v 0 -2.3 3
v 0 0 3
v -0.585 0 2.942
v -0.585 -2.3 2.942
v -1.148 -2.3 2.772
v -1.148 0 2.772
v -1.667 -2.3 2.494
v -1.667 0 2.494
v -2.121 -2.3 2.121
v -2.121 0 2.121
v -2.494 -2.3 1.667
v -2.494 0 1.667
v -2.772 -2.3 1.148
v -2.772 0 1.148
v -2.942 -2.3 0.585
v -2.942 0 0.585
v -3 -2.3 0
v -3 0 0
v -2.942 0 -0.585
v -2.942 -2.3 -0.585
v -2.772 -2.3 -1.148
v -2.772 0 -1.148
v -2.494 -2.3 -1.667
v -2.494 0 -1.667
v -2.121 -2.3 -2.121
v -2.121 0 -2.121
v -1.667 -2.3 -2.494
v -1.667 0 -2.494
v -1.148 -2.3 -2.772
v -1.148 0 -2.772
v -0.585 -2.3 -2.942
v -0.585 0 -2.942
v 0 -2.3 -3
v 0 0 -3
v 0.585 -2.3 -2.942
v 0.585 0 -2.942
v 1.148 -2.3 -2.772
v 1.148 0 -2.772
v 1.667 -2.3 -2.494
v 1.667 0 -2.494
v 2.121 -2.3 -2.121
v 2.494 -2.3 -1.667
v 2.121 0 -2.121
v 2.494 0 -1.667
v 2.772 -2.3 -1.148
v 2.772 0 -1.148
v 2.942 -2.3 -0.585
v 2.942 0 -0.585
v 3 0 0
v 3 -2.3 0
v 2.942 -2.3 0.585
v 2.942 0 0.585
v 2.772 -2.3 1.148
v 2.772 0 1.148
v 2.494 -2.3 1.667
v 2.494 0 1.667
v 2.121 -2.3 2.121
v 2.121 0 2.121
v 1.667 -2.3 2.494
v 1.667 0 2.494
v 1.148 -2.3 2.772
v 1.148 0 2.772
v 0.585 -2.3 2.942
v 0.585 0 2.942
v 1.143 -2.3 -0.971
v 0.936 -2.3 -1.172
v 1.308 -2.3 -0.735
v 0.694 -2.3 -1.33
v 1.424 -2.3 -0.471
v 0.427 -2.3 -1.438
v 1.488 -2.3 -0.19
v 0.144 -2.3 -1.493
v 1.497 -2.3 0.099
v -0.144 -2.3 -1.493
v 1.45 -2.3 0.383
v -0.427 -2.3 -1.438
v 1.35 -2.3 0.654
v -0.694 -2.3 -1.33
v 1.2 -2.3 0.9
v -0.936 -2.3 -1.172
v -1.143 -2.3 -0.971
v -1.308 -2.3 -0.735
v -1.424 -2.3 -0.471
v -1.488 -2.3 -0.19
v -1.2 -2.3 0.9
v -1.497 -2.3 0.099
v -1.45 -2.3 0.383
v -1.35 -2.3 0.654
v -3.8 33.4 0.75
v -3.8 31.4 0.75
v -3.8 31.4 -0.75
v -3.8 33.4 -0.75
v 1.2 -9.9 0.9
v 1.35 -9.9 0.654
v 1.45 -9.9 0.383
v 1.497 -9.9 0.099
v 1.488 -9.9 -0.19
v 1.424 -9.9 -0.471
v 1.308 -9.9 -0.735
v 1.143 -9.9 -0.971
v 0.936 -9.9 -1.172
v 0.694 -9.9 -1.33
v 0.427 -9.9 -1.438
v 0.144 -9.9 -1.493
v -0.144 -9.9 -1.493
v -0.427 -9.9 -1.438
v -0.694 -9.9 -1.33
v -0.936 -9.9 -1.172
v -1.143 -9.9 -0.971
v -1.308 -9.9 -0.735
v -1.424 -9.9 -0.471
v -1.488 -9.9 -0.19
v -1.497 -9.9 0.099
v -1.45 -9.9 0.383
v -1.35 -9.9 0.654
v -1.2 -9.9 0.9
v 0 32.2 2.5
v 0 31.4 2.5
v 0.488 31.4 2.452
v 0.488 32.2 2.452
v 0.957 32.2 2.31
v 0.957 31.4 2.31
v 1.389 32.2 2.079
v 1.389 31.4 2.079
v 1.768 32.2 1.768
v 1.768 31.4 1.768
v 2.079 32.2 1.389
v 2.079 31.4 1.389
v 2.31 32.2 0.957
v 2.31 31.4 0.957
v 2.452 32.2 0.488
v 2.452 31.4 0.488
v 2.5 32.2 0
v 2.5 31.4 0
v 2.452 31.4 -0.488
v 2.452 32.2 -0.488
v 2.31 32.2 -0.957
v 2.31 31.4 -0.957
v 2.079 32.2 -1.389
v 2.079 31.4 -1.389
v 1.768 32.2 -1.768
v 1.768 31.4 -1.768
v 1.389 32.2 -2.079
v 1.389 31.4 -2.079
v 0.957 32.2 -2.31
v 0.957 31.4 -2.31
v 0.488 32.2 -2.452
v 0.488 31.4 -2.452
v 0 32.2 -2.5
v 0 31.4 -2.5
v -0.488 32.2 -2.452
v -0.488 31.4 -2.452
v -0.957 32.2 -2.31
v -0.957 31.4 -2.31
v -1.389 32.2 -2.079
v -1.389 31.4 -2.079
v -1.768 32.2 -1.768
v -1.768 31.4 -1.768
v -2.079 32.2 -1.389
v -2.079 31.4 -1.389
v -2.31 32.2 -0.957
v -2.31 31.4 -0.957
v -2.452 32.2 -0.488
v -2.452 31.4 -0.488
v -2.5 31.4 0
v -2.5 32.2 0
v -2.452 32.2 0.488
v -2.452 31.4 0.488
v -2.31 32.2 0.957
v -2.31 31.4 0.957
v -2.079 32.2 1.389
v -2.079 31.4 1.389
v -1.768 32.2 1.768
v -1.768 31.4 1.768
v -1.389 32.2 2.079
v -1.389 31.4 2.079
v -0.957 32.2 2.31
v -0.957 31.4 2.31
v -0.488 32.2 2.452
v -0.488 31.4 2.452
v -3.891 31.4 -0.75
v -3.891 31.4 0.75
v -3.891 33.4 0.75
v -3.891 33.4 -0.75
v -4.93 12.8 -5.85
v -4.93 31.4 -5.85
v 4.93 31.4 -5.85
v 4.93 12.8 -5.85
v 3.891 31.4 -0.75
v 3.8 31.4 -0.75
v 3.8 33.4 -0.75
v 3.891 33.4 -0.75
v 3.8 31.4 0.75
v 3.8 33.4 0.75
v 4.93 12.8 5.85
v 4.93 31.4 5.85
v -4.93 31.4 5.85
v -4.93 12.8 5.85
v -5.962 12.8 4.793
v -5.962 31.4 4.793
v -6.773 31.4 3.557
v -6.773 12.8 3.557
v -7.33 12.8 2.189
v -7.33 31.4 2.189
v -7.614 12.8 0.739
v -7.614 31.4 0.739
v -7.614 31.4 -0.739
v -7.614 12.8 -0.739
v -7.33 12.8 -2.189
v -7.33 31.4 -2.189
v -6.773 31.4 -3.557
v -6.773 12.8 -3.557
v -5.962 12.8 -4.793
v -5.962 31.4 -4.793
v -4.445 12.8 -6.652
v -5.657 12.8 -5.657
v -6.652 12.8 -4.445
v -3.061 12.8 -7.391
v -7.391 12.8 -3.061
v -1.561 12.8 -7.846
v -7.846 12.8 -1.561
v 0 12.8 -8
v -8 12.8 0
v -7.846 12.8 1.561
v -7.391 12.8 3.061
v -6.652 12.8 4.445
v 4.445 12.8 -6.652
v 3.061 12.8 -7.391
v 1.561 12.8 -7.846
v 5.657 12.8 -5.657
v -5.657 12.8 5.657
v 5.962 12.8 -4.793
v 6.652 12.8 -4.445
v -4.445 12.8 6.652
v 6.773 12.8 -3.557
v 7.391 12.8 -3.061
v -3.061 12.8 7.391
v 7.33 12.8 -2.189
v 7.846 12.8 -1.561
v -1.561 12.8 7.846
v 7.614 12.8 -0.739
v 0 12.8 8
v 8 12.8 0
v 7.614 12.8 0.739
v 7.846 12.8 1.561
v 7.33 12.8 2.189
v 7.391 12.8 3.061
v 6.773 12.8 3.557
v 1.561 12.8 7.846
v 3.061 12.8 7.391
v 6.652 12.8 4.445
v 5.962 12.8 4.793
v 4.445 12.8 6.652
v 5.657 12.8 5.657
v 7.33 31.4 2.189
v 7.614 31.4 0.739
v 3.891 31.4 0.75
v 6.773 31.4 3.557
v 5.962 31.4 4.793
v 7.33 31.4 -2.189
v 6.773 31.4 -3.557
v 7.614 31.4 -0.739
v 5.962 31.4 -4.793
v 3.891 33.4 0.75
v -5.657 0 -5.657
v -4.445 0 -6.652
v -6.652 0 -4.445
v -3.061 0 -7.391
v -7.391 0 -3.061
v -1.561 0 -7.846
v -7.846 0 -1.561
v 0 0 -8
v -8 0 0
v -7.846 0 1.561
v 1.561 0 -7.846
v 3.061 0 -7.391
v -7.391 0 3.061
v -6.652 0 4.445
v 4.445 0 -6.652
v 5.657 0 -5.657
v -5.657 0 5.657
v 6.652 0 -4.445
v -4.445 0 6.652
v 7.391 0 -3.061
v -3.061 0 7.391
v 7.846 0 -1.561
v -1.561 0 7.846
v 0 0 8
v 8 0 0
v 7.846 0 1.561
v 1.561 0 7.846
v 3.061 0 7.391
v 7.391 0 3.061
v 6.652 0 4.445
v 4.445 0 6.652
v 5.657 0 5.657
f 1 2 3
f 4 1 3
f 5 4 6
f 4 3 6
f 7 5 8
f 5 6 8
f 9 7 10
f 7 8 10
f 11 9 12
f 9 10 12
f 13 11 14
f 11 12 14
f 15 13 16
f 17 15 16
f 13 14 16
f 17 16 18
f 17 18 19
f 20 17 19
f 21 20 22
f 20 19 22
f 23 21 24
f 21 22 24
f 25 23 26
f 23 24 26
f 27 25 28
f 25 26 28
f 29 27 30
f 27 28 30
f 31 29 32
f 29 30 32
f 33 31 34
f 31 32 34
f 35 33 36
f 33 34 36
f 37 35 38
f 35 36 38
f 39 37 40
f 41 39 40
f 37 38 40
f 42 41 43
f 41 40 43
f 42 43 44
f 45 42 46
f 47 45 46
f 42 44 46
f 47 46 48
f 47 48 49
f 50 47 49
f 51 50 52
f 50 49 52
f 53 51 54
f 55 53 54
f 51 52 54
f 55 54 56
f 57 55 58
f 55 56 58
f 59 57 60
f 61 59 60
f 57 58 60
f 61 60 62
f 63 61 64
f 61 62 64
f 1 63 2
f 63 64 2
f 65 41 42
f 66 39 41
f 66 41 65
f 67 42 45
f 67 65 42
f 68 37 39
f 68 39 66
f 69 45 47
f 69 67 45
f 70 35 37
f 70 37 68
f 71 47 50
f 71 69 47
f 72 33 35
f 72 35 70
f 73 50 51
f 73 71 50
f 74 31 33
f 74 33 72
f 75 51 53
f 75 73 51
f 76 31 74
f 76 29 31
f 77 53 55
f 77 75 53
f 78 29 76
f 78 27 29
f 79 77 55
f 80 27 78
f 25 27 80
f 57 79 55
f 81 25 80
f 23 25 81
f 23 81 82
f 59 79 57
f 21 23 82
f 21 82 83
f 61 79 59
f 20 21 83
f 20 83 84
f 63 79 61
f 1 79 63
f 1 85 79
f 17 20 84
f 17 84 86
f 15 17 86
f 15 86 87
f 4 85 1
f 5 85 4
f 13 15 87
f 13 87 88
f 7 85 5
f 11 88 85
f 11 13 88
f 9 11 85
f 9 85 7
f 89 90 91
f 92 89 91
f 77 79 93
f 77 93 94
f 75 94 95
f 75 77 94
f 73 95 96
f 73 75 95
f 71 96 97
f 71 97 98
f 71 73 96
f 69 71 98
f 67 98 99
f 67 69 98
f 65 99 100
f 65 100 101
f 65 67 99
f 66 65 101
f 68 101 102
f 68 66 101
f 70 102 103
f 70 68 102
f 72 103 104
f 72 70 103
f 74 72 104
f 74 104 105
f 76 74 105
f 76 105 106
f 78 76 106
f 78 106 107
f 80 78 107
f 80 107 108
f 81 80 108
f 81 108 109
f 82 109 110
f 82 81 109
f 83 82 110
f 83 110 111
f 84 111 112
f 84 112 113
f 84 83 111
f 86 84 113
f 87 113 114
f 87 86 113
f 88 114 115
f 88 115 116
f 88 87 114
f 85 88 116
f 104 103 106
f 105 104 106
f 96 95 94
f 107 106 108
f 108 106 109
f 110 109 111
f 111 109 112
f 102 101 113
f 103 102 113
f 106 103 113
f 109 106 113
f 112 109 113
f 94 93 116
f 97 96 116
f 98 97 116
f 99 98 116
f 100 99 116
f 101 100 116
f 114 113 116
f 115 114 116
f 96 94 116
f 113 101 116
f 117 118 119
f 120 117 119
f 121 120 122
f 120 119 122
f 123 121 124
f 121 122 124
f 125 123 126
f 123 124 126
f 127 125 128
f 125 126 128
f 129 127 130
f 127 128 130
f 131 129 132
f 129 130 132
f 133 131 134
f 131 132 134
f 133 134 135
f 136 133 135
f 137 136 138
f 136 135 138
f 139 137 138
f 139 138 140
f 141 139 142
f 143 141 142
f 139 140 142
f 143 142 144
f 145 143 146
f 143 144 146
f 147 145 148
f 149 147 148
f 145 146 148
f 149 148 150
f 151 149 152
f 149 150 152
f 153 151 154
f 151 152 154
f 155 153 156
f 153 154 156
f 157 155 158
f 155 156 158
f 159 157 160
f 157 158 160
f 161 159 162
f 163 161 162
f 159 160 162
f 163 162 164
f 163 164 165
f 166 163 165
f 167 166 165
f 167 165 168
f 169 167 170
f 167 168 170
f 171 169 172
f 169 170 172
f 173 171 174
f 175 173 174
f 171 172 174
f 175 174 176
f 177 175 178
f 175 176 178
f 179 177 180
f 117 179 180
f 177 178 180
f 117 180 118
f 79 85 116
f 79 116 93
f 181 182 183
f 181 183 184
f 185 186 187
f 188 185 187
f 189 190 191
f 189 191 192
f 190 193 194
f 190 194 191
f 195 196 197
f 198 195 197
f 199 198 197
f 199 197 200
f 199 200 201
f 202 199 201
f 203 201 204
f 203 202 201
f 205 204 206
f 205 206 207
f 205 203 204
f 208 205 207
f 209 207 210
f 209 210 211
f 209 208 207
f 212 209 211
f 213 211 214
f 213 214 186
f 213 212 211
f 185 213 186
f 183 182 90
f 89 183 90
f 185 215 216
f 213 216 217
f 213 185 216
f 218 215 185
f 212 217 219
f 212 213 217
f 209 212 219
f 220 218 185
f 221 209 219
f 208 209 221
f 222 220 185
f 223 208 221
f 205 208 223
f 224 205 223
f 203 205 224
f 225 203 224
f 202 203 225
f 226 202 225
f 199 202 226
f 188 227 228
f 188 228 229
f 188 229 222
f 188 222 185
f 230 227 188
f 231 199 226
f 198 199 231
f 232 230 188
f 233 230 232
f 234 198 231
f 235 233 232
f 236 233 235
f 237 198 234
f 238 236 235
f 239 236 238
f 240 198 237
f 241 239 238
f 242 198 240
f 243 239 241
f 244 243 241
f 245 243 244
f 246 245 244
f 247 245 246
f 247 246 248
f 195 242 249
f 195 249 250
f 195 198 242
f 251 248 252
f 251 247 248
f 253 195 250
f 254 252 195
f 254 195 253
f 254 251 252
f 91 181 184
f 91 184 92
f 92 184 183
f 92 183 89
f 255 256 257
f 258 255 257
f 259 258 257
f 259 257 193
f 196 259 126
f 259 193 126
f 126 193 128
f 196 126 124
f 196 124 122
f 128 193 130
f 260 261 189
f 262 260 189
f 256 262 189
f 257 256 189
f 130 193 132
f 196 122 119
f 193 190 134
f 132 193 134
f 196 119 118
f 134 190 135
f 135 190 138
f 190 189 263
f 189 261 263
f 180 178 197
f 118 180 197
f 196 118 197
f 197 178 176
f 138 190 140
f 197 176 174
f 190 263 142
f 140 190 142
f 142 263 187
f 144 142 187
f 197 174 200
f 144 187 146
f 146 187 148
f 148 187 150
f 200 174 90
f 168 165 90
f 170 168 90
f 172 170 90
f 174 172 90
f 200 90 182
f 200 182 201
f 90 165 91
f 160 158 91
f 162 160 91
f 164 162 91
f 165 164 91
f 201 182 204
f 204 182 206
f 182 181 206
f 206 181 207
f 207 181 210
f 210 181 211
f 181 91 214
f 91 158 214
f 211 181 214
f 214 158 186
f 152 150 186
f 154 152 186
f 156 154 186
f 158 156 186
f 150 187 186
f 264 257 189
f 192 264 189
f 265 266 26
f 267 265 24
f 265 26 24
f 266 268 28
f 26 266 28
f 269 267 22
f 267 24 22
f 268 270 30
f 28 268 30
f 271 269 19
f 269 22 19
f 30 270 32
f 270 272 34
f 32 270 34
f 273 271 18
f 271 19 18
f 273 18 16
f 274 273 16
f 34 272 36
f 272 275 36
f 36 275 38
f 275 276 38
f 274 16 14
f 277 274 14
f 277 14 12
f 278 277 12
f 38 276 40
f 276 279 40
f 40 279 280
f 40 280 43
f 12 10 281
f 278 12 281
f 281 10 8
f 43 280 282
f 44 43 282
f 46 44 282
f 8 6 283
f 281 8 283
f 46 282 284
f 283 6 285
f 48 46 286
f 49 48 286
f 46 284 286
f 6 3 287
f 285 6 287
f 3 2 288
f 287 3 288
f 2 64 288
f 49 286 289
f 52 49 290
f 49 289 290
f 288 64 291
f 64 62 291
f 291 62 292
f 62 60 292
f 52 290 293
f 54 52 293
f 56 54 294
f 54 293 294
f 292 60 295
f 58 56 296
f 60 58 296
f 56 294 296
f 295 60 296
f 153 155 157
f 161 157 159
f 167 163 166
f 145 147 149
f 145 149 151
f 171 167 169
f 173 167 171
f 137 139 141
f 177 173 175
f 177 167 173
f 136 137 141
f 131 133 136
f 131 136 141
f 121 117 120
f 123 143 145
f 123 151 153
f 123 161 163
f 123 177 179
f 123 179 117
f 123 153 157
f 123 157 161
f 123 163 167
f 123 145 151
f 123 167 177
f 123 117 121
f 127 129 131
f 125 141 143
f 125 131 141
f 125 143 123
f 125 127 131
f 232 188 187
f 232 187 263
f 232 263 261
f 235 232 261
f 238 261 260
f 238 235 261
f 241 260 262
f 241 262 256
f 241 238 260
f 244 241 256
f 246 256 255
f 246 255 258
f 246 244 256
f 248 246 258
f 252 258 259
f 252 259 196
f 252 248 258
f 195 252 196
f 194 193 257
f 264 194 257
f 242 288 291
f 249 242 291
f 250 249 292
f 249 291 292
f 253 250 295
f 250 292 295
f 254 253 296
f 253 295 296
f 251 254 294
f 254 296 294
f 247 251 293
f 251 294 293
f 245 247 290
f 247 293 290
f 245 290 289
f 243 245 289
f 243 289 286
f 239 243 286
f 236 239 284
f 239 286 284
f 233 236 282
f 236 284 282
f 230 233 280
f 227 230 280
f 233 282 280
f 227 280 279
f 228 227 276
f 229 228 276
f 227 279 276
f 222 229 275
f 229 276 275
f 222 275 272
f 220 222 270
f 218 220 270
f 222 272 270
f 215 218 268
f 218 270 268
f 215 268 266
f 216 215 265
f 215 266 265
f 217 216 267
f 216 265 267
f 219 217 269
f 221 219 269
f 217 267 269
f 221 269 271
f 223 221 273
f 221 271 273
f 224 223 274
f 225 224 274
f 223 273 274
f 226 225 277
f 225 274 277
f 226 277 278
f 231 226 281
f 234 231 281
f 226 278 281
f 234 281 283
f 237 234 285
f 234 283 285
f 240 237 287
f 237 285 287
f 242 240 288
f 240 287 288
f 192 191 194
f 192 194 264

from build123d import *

# Parameters (mm, degrees)
SKETCH_1_R      = 8
EXTRUDE_1_DEPTH = 12.8
EXTRUDE_2_DEPTH = 18.6
SKETCH_3_R      = 2.5
EXTRUDE_3_DEPTH = 0.8
SKETCH_4_W      = 0.091344541
SKETCH_4_H      = 1.5
EXTRUDE_4_DEPTH = 2
SKETCH_5_R      = 3
EXTRUDE_5_DEPTH = 2.3
EXTRUDE_6_DEPTH = 7.6


with BuildPart() as part:
    # Эскиз1 → Бобышка-Вытянуть1 (new body)
    with BuildSketch(Plane(origin=(0, 0, 0), x_dir=(1, 0, 0), z_dir=(0, 1, 0))):
        with Locations(Location((0, 0, 0), (0, 0, 270))):
            Circle(SKETCH_1_R)
    extrude(amount=EXTRUDE_1_DEPTH)

    # Эскиз2 → Бобышка-Вытянуть2 (add)
    with BuildSketch(Plane(origin=(0, 12.8, 0), x_dir=(1, 0, 0), z_dir=(0, 1, 0))):
        with BuildLine():
            Line((-4.929503018, 5.85), (4.929503018, 5.85))
            ThreePointArc((4.929503018, 5.85), (7.65, 0), (4.929503018, -5.85))
            Line((4.929503018, -5.85), (-4.929503018, -5.85))
            ThreePointArc((-4.929503018, -5.85), (-7.65, 0), (-4.929503018, 5.85))
        make_face()
    extrude(amount=EXTRUDE_2_DEPTH)

    # Эскиз3 → Бобышка-Вытянуть3 (add)
    with BuildSketch(Plane(origin=(0, 31.4, 0), x_dir=(1, 0, 0), z_dir=(0, 1, 0))):
        with Locations(Location((0, 0, 0), (0, 0, 270))):
            Circle(SKETCH_3_R)
    extrude(amount=EXTRUDE_3_DEPTH)

    # Эскиз4 → Бобышка-Вытянуть4 (add)
    with BuildSketch(Plane(origin=(0, 31.4, 0), x_dir=(1, 0, 0), z_dir=(0, 1, 0))):
        with Locations((-3.845672271, 0)):
            Rectangle(SKETCH_4_W, SKETCH_4_H)
        with Locations((3.845672271, 0)):
            Rectangle(SKETCH_4_W, SKETCH_4_H)
    extrude(amount=EXTRUDE_4_DEPTH)

    # Эскиз5 → Бобышка-Вытянуть5 (add)
    with BuildSketch(Plane.XZ):
        with Locations(Location((0, 0, 0), (0, 0, 90))):
            Circle(SKETCH_5_R)
    extrude(amount=EXTRUDE_5_DEPTH)

    # Эскиз6 → Бобышка-Вытянуть6 (add)
    with BuildSketch(Plane.XZ.offset(2.3)):
        with BuildLine():
            Line((-1.2, 0.9), (1.2, 0.9))
            ThreePointArc((1.2, 0.9), (0, -1.5), (-1.2, 0.9))
        make_face()
    extrude(amount=EXTRUDE_6_DEPTH)


solid = part.part
